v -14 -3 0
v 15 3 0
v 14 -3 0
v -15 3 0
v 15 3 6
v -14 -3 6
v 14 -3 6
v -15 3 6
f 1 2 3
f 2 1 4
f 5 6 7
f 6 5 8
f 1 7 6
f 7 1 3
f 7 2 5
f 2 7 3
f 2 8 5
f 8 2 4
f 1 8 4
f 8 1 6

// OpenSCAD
// Rectangular shaft key with chamfered ends.
$fn = 60;
eps = 0.02;
key_w = 6;
key_h = 6;
key_l = 30;
chamfer = 1;
polyhedron(points = [
    [-key_l / 2 + chamfer, -key_w / 2, 0], [key_l / 2 - chamfer, -key_w / 2, 0], [key_l / 2, key_w / 2, 0], [-key_l / 2, key_w / 2, 0],
    [-key_l / 2 + chamfer, -key_w / 2, key_h], [key_l / 2 - chamfer, -key_w / 2, key_h], [key_l / 2, key_w / 2, key_h], [-key_l / 2, key_w / 2, key_h]
], faces = [[0,1,2,3],[4,7,6,5],[0,4,5,1],[1,5,6,2],[2,6,7,3],[3,7,4,0]]);
